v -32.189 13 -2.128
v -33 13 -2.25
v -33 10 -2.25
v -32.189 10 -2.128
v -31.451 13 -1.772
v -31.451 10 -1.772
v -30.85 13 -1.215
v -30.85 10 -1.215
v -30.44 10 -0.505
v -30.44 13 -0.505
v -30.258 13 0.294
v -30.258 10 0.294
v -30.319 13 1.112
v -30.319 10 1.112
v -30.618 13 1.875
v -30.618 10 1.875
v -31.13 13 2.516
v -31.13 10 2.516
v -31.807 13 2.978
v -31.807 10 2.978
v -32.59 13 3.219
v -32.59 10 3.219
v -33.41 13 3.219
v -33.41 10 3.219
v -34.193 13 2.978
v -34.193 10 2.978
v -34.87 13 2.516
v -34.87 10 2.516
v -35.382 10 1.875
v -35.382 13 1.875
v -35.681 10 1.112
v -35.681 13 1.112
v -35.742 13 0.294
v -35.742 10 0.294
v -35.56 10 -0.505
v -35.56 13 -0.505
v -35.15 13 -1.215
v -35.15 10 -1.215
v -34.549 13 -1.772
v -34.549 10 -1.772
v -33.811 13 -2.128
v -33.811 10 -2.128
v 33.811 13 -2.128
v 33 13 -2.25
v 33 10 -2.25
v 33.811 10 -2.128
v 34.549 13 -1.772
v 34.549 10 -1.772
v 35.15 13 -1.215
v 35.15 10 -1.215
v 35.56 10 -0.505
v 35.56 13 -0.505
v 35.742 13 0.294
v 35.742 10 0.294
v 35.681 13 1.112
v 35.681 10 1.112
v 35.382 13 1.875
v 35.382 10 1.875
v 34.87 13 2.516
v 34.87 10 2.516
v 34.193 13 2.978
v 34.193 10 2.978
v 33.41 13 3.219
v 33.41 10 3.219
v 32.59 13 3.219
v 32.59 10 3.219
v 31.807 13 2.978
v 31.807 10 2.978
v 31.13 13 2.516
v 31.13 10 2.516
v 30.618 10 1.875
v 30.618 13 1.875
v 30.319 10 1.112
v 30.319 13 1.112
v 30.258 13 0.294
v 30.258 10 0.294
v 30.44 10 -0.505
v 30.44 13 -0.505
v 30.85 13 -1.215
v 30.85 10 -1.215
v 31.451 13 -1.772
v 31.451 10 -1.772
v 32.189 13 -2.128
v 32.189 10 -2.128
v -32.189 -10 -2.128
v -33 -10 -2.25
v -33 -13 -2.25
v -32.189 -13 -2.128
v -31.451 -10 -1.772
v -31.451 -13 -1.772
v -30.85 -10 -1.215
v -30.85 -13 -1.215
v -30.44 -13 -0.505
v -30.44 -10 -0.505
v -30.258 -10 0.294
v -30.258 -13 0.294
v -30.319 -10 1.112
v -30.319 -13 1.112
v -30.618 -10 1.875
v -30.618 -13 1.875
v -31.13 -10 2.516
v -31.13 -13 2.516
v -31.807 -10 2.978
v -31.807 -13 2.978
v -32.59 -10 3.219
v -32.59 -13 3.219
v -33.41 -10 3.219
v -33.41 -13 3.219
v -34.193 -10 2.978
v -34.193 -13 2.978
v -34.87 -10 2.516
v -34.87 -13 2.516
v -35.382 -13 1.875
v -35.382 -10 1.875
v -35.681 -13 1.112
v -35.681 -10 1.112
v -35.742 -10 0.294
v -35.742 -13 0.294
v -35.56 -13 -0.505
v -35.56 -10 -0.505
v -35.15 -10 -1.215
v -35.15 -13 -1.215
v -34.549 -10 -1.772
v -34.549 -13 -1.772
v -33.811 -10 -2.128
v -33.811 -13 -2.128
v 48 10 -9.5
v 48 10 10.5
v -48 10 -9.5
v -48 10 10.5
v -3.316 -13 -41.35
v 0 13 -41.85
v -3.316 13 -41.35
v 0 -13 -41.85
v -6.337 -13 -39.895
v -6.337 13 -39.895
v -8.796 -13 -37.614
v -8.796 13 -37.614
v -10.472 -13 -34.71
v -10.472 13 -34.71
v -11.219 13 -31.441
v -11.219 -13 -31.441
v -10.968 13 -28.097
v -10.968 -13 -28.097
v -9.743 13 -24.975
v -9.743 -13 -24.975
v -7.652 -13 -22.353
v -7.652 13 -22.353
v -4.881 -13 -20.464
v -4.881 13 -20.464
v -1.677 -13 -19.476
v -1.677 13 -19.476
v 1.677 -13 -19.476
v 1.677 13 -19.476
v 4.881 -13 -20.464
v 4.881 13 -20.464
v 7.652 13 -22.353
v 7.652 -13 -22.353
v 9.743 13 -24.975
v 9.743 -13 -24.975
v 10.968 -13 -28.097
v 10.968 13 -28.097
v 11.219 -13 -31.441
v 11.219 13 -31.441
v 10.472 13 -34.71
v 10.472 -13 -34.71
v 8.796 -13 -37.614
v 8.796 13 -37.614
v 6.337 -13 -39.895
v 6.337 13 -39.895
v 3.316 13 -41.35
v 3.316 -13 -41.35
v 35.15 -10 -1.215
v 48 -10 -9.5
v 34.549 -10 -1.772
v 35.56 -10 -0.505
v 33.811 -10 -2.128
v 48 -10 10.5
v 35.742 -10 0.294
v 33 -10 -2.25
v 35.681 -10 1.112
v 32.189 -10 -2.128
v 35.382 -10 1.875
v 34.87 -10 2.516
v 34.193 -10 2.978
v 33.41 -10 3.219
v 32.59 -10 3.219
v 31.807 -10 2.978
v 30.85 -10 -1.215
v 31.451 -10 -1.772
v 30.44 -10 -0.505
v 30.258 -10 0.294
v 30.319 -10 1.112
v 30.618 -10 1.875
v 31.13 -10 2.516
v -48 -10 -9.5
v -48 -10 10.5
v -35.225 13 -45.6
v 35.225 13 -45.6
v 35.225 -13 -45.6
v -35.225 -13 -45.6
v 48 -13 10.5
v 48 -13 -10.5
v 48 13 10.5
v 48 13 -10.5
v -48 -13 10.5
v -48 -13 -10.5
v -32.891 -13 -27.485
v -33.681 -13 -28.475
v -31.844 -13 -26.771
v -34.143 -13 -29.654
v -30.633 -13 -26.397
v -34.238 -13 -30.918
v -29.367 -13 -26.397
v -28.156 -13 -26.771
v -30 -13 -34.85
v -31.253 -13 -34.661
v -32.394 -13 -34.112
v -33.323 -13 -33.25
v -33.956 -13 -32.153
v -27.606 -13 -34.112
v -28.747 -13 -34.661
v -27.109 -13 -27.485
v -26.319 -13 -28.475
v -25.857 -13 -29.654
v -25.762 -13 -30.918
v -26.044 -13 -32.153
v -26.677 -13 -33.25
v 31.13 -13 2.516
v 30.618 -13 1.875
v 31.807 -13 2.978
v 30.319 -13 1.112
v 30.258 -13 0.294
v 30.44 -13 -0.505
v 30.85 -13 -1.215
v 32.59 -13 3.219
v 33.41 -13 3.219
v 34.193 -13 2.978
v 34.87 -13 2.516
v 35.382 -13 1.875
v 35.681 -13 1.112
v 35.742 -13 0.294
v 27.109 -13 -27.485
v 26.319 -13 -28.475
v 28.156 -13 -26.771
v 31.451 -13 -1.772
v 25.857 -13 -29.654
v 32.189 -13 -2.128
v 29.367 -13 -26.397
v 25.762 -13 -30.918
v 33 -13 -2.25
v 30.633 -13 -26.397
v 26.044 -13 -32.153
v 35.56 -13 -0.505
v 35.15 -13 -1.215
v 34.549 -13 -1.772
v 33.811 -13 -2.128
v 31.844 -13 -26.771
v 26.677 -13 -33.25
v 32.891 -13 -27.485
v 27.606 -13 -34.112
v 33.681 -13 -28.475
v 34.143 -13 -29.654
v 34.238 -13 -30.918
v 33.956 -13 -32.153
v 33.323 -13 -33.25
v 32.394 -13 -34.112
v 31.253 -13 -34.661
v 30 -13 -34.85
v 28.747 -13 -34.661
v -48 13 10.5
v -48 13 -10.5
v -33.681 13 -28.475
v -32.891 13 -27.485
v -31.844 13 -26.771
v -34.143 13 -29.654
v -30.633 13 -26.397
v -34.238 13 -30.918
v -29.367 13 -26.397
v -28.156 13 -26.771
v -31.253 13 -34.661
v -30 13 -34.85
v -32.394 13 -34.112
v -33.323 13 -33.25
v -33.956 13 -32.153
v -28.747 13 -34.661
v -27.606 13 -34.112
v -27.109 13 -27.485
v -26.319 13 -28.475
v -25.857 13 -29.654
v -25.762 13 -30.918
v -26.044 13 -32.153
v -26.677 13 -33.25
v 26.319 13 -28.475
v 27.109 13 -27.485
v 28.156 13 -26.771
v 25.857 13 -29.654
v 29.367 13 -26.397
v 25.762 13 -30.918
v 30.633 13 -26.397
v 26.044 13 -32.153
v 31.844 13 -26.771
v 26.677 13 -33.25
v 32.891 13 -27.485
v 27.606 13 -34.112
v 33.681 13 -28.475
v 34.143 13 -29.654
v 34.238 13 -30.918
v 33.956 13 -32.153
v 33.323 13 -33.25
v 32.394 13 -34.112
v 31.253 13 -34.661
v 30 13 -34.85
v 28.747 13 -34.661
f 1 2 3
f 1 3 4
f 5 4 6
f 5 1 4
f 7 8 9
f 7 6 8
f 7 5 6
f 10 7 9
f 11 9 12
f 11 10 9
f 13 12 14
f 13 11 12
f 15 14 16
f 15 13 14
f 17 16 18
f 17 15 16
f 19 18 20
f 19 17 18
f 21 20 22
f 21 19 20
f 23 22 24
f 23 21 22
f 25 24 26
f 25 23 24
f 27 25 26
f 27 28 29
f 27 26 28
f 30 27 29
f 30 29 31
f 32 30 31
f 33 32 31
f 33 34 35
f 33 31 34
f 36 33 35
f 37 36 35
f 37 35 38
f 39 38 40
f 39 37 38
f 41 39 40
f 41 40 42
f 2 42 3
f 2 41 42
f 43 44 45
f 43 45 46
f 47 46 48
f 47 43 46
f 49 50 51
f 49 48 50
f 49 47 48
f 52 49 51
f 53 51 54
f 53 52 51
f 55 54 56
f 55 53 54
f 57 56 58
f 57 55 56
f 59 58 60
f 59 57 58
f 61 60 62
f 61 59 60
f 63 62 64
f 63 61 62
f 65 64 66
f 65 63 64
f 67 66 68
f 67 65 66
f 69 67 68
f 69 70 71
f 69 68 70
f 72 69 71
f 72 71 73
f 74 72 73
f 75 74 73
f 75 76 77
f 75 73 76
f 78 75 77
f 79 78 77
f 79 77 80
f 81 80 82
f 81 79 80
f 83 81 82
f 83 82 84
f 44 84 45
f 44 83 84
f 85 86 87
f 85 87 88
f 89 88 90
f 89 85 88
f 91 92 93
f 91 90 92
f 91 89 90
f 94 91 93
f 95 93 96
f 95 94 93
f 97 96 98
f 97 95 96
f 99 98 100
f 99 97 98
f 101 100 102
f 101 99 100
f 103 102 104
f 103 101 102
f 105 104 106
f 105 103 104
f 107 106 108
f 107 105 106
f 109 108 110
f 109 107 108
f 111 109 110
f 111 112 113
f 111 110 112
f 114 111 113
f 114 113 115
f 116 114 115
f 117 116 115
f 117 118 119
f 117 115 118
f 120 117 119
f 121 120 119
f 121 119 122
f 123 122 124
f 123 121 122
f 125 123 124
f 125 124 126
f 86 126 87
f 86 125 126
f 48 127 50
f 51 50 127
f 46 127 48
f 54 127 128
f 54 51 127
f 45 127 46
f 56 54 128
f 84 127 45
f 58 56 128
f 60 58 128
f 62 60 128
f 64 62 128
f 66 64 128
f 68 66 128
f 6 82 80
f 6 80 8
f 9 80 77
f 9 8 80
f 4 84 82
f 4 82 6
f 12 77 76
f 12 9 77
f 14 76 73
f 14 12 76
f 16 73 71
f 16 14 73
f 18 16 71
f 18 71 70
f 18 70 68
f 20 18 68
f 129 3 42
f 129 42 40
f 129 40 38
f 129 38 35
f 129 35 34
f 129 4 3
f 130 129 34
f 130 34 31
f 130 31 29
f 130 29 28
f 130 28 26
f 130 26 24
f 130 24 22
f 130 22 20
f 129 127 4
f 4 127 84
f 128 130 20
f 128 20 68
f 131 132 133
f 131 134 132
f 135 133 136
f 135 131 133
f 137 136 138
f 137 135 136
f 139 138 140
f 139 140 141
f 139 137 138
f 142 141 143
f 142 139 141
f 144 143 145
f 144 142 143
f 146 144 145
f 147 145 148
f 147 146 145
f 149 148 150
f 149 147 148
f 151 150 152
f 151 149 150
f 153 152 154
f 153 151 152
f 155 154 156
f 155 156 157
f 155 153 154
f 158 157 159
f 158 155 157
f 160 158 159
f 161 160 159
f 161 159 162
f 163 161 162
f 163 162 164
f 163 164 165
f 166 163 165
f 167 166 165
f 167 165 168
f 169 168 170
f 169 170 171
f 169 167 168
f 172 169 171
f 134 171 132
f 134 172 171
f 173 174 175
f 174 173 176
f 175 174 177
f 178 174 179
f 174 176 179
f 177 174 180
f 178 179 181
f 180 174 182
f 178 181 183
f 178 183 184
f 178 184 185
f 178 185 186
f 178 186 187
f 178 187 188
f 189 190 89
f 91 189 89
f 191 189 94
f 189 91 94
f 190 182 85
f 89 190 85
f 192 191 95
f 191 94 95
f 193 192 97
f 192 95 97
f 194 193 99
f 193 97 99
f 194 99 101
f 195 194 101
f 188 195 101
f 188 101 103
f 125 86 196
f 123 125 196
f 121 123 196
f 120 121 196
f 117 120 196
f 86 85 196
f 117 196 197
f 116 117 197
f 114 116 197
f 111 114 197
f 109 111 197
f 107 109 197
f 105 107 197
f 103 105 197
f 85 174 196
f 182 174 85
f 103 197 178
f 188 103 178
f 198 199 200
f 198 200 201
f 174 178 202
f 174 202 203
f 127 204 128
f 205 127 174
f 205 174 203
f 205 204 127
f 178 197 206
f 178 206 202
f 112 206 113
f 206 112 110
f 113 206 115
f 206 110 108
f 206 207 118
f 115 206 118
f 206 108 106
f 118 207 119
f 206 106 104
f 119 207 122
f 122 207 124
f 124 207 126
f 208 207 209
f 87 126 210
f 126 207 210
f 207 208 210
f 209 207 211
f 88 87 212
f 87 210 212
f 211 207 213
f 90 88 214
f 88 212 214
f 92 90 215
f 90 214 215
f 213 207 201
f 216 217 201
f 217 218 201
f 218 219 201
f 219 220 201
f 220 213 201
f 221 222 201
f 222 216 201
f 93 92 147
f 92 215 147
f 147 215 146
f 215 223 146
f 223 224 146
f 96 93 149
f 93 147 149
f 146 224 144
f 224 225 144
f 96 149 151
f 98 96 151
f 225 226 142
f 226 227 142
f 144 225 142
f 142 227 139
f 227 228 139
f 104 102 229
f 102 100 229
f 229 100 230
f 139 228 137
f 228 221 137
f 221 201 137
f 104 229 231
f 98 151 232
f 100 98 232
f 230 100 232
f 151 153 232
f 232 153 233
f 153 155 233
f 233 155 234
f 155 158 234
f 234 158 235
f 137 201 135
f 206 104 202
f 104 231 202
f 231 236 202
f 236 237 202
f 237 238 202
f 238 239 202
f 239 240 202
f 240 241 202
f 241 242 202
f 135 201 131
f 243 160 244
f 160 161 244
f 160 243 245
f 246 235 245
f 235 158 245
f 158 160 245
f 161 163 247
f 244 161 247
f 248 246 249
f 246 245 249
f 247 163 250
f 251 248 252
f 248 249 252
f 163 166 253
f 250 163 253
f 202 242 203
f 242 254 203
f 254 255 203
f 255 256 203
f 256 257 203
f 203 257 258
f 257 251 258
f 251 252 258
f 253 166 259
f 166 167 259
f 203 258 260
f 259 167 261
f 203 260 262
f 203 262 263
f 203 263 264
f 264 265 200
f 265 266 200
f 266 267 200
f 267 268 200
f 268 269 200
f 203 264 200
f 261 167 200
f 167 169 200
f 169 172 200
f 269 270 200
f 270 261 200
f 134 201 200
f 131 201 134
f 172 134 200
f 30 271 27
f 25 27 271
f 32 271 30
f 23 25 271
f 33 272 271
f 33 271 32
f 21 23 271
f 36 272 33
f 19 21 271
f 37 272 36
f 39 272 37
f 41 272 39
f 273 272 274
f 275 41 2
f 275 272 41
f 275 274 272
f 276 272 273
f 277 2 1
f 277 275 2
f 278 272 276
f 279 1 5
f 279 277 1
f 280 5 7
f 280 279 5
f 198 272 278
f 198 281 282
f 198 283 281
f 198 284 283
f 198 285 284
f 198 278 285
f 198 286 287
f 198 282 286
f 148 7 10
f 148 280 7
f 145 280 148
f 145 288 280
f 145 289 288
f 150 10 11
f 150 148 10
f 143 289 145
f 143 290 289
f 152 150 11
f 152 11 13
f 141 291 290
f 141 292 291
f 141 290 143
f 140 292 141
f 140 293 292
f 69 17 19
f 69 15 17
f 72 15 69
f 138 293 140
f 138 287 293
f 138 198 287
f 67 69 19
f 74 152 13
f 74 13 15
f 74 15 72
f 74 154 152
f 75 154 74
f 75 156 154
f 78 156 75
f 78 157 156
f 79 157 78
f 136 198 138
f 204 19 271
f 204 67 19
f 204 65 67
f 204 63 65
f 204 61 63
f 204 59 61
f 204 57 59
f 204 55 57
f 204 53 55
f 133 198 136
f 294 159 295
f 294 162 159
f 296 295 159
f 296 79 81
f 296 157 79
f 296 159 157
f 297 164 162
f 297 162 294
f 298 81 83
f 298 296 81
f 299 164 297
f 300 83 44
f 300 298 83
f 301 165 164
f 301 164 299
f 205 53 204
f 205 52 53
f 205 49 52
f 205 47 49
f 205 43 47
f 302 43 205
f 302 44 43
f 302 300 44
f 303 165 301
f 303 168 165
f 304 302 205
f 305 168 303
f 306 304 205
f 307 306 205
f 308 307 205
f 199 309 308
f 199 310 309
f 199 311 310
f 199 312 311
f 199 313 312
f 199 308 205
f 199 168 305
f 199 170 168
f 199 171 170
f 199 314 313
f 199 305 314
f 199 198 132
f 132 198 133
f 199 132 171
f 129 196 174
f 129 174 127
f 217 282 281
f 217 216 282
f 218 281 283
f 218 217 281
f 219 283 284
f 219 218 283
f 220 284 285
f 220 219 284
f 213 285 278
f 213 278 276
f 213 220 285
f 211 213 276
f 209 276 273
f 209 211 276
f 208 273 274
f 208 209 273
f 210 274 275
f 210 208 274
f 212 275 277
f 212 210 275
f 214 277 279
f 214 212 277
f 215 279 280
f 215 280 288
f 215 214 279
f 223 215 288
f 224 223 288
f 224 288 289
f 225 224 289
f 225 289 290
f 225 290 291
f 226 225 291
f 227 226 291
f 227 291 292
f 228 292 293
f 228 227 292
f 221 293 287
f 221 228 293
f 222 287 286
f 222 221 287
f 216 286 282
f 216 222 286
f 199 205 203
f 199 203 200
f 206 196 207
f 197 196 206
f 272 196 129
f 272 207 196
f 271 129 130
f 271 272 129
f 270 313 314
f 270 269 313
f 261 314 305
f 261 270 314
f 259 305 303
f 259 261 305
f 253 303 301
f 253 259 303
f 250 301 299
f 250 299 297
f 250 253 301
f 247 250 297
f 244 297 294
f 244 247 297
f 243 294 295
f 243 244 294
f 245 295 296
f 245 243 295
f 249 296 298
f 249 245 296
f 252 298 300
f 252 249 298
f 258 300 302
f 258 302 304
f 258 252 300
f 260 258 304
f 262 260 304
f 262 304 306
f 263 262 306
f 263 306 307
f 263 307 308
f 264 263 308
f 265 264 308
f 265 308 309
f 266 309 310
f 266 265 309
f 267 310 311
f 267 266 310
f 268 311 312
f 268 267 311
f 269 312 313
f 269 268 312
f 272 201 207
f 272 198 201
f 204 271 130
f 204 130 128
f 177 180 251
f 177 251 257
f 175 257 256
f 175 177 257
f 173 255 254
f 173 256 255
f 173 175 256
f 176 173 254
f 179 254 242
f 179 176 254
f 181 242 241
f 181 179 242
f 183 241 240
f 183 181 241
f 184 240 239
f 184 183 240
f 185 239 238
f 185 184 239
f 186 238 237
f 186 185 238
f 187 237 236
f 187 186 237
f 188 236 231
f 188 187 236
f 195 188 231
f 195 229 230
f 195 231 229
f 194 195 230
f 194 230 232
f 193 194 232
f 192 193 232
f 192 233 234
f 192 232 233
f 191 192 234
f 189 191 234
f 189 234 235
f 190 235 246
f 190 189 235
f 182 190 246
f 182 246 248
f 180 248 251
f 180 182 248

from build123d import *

# Parameters (mm, degrees)
SKETCH_1_R              = 11.25
SKETCH_1_R_2            = 4.25
EXTRUDE_1_DEPTH         = 13
SKETCH_2_W              = 20
SKETCH_2_H              = 20
CUT_EXTRUDE_1_DEPTH     = 108.071751643
CUT_EXTRUDE1_DEPTH      = 71.08823011
CUT_EXTRUDE1_DEPTH_BACK = 71.08823011
SKETCH1_R               = 2.75


with BuildPart() as part:
    # Эскиз1 → Бобышка-Вытянуть1 (new, symmetric)
    with BuildSketch(Plane(origin=(0, 0, 0), x_dir=(1, 0, 0), z_dir=(0, 1, 0))):
        Polygon((-48, -10.5), (48, -10.5), (48, 10.5), (35.224644777, 45.6), (0, 45.6), (-35.224644777, 45.6), (-48, 10.5), align=None)
        with Locations(Location((0, 30.6, 0), (0, 0, 90))):
            Circle(SKETCH_1_R, mode=Mode.SUBTRACT)
        with Locations(Location((-30, 30.6, 0), (0, 0, 90))):
            Circle(SKETCH_1_R_2, mode=Mode.SUBTRACT)
        with Locations(Location((30, 30.6, 0), (0, 0, 90))):
            Circle(SKETCH_1_R_2, mode=Mode.SUBTRACT)
    extrude(amount=EXTRUDE_1_DEPTH, both=True)

    # Эскиз2 → Вырез-Вытянуть1 (cut, through all)
    with BuildSketch(Plane.ZY.offset(48)):
        with Locations((0.5, 0)):
            Rectangle(SKETCH_2_W, SKETCH_2_H)
    extrude(amount=-CUT_EXTRUDE_1_DEPTH, mode=Mode.SUBTRACT)

    # Sketch1 → Cut-Extrude1 (cut, two sides: drawn at the far end of the back side and taken through both)
    with BuildSketch(Plane.XZ.offset(-10).offset(-CUT_EXTRUDE1_DEPTH_BACK)):
        with Locations(Location((-33, 0.5, 0), (0, 0, 270))):
            Circle(SKETCH1_R)
        with Locations(Location((33, 0.5, 0), (0, 0, 270))):
            Circle(SKETCH1_R)
    extrude(amount=CUT_EXTRUDE1_DEPTH + CUT_EXTRUDE1_DEPTH_BACK, mode=Mode.SUBTRACT)


solid = part.part
